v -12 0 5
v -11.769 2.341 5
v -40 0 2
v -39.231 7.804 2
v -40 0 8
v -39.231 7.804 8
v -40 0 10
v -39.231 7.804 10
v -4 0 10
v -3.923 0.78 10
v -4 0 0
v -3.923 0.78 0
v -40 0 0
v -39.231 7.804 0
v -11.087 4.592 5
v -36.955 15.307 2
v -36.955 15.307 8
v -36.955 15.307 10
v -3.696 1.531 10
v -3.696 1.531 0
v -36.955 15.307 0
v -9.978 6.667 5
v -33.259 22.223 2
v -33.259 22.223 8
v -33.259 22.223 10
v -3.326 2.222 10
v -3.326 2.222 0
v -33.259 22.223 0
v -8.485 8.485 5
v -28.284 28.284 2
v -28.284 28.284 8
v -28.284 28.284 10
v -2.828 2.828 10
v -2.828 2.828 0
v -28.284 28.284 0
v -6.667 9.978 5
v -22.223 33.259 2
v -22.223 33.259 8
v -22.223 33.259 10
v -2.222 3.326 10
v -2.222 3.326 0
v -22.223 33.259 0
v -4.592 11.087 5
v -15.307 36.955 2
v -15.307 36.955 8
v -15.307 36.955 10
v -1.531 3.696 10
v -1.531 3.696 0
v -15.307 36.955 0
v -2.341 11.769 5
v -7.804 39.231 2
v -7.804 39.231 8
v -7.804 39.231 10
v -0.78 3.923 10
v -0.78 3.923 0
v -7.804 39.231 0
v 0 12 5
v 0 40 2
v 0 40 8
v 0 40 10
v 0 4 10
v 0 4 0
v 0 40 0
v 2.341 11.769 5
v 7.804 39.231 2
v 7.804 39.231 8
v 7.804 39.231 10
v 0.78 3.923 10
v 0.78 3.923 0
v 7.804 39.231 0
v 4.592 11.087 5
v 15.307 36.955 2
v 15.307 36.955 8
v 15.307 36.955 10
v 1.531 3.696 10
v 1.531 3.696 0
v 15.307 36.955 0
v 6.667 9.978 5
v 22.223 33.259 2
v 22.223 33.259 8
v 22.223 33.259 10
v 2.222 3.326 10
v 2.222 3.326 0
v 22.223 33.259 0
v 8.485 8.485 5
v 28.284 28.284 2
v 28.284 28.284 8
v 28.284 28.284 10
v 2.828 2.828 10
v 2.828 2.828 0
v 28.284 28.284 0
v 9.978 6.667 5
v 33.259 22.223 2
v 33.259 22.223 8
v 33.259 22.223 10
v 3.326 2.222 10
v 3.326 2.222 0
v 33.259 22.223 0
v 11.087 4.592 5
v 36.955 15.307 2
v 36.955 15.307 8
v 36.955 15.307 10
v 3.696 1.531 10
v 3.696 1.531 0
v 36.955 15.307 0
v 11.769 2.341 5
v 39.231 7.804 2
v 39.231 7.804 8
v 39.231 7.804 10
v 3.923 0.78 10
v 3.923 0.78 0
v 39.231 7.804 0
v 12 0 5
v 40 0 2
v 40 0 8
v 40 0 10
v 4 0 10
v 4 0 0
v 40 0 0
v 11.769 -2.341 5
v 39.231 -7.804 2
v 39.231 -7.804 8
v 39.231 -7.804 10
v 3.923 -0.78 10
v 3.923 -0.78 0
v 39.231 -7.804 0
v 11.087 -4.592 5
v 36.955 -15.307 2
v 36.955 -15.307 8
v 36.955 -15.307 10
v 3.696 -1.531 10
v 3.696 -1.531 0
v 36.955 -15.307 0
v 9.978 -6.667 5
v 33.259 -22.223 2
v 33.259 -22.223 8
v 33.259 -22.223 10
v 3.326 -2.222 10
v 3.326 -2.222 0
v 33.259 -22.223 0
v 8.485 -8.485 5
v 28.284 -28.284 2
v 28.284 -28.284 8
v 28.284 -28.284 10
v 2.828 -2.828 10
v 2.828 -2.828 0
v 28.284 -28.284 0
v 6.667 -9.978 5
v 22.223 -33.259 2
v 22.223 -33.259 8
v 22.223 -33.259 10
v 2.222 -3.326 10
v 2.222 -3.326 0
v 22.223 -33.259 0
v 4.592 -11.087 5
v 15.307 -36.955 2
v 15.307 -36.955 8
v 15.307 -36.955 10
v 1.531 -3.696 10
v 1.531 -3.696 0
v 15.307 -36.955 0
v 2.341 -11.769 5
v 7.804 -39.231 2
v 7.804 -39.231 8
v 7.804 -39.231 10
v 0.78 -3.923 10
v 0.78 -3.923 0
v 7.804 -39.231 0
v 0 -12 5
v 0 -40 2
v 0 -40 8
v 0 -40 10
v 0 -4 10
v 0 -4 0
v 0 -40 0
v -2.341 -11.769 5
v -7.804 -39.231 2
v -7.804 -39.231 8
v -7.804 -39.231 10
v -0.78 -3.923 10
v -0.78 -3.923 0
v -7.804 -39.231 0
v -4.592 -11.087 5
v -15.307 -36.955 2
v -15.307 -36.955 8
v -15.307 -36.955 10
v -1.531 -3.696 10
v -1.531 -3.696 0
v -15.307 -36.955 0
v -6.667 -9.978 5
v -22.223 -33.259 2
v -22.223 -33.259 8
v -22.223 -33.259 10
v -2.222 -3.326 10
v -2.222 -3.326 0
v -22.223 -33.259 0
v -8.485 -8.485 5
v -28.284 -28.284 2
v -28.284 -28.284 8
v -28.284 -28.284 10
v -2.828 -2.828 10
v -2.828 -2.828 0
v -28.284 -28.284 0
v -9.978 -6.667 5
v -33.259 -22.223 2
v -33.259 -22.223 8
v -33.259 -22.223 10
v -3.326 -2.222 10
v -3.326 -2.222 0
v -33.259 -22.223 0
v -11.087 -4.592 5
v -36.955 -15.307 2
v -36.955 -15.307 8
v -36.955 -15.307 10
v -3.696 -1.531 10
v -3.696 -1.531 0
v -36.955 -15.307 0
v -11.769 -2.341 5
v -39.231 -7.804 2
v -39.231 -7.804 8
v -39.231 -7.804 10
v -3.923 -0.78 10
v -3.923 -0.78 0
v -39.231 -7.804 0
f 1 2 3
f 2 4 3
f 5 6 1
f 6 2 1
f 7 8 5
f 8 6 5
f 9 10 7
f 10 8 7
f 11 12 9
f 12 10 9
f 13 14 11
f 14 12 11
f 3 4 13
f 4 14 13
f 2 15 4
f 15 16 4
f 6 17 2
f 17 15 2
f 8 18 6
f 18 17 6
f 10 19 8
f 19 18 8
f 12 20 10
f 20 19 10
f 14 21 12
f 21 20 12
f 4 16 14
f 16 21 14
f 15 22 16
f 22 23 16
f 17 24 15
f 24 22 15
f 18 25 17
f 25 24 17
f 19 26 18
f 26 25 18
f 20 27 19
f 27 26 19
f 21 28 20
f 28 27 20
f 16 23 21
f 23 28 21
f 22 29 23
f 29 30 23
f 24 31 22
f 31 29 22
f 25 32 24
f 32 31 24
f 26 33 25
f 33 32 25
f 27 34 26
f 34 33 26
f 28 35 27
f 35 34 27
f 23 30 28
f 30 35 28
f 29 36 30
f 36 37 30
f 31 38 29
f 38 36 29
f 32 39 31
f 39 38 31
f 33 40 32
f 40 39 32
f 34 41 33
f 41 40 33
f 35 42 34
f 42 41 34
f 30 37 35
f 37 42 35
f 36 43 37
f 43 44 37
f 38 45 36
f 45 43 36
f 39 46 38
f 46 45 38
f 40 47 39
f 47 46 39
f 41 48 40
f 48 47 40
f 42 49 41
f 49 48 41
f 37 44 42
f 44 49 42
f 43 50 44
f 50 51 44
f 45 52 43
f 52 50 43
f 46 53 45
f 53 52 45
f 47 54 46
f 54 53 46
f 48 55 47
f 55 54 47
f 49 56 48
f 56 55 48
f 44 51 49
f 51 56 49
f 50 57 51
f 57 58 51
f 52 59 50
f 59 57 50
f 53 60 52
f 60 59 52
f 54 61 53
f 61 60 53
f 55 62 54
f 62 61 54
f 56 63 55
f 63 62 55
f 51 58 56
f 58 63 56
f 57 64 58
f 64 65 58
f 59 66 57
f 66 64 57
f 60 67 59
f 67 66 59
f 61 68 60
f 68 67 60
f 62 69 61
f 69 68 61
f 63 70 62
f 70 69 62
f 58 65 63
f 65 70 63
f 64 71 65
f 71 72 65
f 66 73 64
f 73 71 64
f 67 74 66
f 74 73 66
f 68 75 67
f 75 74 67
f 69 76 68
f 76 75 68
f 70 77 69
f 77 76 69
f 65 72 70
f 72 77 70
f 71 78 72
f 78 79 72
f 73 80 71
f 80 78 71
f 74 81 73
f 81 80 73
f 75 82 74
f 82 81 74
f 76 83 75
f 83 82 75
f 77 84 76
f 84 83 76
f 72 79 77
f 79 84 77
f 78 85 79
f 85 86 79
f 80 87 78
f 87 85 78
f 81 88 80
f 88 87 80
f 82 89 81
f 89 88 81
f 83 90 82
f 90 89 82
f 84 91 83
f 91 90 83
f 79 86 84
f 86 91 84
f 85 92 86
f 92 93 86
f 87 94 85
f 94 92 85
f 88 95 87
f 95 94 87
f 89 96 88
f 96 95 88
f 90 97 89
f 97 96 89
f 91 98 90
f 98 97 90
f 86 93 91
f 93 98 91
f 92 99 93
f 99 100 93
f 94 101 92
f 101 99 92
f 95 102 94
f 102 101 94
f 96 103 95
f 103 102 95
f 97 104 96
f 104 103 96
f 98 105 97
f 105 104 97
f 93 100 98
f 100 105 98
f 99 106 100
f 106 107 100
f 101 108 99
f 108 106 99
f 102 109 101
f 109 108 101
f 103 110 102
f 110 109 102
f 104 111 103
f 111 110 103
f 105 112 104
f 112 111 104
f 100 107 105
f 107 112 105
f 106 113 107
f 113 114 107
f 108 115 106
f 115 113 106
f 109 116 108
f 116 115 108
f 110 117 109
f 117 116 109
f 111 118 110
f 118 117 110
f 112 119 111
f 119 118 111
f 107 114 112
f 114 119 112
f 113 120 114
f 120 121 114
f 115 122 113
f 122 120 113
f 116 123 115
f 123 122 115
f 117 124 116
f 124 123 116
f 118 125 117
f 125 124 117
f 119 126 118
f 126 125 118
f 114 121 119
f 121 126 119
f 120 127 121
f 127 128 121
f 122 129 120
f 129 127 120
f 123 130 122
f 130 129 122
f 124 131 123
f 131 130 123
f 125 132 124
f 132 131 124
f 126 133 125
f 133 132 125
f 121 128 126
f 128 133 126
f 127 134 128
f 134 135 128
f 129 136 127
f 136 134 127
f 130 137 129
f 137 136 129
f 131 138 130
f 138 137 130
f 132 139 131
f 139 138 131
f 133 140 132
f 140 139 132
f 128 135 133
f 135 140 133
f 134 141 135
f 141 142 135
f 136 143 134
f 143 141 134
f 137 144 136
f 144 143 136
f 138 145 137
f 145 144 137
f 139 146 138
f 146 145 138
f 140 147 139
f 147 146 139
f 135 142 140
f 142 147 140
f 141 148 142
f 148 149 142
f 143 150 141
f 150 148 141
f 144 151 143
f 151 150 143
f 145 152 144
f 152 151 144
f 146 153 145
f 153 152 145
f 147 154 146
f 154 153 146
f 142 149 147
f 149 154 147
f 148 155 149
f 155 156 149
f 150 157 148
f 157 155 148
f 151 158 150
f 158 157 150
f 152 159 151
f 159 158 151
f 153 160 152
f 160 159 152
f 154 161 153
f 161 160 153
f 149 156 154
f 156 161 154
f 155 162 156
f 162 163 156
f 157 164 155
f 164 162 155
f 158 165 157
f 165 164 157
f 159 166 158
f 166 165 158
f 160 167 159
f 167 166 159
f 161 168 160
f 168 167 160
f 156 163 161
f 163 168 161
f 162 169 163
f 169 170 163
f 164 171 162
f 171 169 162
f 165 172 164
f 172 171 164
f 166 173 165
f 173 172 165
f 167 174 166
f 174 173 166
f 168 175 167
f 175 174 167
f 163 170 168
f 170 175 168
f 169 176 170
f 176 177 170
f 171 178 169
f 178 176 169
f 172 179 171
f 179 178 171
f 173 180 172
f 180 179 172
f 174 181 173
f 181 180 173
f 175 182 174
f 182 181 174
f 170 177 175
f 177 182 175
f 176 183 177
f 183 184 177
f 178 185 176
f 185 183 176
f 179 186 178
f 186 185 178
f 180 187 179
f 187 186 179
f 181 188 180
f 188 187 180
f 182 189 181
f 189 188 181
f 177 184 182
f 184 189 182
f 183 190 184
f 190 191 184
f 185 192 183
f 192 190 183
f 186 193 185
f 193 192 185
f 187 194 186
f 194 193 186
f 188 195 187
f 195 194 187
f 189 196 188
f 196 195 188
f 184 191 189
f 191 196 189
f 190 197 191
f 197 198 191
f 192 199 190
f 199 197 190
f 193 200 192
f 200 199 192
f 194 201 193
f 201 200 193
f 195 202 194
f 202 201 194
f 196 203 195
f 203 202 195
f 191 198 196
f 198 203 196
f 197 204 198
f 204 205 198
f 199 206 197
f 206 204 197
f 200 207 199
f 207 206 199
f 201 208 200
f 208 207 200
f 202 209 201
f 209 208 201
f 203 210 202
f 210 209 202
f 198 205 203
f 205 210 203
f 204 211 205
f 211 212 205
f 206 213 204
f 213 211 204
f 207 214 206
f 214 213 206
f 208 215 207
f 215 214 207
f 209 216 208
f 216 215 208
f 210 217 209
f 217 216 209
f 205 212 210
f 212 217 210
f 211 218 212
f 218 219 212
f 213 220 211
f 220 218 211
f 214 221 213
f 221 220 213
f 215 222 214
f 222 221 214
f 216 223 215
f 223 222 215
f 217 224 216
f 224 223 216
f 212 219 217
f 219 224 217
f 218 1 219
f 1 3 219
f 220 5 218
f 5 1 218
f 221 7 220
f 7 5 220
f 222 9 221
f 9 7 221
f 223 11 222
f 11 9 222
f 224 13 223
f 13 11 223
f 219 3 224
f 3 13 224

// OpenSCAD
$fn = 32;

// ----------------------------------------------------------------------
// Revolved part: V-groove pulley R40
// ----------------------------------------------------------------------

// --- parameters (mm) ---
bore_r = 4;               // bore radius
rim_r = 40;               // rim radius
rim_t = 10;               // rim width
groove_r = 12;            // groove root radius
groove_w = 3;             // groove half width
revolve_angle = 360;      // revolve sweep, degrees

bore_d = 2 * bore_r;
rim_d = 2 * rim_r;
groove_d = 2 * groove_r;

profile = [[4, 0], [40, 0], [40, 2], [12, 5], [40, 8], [40, 10], [4, 10]];  // primary outline, 7 points, counter clockwise

// --- the one profile operation ---
rotate_extrude(angle = revolve_angle) polygon(points = profile);
